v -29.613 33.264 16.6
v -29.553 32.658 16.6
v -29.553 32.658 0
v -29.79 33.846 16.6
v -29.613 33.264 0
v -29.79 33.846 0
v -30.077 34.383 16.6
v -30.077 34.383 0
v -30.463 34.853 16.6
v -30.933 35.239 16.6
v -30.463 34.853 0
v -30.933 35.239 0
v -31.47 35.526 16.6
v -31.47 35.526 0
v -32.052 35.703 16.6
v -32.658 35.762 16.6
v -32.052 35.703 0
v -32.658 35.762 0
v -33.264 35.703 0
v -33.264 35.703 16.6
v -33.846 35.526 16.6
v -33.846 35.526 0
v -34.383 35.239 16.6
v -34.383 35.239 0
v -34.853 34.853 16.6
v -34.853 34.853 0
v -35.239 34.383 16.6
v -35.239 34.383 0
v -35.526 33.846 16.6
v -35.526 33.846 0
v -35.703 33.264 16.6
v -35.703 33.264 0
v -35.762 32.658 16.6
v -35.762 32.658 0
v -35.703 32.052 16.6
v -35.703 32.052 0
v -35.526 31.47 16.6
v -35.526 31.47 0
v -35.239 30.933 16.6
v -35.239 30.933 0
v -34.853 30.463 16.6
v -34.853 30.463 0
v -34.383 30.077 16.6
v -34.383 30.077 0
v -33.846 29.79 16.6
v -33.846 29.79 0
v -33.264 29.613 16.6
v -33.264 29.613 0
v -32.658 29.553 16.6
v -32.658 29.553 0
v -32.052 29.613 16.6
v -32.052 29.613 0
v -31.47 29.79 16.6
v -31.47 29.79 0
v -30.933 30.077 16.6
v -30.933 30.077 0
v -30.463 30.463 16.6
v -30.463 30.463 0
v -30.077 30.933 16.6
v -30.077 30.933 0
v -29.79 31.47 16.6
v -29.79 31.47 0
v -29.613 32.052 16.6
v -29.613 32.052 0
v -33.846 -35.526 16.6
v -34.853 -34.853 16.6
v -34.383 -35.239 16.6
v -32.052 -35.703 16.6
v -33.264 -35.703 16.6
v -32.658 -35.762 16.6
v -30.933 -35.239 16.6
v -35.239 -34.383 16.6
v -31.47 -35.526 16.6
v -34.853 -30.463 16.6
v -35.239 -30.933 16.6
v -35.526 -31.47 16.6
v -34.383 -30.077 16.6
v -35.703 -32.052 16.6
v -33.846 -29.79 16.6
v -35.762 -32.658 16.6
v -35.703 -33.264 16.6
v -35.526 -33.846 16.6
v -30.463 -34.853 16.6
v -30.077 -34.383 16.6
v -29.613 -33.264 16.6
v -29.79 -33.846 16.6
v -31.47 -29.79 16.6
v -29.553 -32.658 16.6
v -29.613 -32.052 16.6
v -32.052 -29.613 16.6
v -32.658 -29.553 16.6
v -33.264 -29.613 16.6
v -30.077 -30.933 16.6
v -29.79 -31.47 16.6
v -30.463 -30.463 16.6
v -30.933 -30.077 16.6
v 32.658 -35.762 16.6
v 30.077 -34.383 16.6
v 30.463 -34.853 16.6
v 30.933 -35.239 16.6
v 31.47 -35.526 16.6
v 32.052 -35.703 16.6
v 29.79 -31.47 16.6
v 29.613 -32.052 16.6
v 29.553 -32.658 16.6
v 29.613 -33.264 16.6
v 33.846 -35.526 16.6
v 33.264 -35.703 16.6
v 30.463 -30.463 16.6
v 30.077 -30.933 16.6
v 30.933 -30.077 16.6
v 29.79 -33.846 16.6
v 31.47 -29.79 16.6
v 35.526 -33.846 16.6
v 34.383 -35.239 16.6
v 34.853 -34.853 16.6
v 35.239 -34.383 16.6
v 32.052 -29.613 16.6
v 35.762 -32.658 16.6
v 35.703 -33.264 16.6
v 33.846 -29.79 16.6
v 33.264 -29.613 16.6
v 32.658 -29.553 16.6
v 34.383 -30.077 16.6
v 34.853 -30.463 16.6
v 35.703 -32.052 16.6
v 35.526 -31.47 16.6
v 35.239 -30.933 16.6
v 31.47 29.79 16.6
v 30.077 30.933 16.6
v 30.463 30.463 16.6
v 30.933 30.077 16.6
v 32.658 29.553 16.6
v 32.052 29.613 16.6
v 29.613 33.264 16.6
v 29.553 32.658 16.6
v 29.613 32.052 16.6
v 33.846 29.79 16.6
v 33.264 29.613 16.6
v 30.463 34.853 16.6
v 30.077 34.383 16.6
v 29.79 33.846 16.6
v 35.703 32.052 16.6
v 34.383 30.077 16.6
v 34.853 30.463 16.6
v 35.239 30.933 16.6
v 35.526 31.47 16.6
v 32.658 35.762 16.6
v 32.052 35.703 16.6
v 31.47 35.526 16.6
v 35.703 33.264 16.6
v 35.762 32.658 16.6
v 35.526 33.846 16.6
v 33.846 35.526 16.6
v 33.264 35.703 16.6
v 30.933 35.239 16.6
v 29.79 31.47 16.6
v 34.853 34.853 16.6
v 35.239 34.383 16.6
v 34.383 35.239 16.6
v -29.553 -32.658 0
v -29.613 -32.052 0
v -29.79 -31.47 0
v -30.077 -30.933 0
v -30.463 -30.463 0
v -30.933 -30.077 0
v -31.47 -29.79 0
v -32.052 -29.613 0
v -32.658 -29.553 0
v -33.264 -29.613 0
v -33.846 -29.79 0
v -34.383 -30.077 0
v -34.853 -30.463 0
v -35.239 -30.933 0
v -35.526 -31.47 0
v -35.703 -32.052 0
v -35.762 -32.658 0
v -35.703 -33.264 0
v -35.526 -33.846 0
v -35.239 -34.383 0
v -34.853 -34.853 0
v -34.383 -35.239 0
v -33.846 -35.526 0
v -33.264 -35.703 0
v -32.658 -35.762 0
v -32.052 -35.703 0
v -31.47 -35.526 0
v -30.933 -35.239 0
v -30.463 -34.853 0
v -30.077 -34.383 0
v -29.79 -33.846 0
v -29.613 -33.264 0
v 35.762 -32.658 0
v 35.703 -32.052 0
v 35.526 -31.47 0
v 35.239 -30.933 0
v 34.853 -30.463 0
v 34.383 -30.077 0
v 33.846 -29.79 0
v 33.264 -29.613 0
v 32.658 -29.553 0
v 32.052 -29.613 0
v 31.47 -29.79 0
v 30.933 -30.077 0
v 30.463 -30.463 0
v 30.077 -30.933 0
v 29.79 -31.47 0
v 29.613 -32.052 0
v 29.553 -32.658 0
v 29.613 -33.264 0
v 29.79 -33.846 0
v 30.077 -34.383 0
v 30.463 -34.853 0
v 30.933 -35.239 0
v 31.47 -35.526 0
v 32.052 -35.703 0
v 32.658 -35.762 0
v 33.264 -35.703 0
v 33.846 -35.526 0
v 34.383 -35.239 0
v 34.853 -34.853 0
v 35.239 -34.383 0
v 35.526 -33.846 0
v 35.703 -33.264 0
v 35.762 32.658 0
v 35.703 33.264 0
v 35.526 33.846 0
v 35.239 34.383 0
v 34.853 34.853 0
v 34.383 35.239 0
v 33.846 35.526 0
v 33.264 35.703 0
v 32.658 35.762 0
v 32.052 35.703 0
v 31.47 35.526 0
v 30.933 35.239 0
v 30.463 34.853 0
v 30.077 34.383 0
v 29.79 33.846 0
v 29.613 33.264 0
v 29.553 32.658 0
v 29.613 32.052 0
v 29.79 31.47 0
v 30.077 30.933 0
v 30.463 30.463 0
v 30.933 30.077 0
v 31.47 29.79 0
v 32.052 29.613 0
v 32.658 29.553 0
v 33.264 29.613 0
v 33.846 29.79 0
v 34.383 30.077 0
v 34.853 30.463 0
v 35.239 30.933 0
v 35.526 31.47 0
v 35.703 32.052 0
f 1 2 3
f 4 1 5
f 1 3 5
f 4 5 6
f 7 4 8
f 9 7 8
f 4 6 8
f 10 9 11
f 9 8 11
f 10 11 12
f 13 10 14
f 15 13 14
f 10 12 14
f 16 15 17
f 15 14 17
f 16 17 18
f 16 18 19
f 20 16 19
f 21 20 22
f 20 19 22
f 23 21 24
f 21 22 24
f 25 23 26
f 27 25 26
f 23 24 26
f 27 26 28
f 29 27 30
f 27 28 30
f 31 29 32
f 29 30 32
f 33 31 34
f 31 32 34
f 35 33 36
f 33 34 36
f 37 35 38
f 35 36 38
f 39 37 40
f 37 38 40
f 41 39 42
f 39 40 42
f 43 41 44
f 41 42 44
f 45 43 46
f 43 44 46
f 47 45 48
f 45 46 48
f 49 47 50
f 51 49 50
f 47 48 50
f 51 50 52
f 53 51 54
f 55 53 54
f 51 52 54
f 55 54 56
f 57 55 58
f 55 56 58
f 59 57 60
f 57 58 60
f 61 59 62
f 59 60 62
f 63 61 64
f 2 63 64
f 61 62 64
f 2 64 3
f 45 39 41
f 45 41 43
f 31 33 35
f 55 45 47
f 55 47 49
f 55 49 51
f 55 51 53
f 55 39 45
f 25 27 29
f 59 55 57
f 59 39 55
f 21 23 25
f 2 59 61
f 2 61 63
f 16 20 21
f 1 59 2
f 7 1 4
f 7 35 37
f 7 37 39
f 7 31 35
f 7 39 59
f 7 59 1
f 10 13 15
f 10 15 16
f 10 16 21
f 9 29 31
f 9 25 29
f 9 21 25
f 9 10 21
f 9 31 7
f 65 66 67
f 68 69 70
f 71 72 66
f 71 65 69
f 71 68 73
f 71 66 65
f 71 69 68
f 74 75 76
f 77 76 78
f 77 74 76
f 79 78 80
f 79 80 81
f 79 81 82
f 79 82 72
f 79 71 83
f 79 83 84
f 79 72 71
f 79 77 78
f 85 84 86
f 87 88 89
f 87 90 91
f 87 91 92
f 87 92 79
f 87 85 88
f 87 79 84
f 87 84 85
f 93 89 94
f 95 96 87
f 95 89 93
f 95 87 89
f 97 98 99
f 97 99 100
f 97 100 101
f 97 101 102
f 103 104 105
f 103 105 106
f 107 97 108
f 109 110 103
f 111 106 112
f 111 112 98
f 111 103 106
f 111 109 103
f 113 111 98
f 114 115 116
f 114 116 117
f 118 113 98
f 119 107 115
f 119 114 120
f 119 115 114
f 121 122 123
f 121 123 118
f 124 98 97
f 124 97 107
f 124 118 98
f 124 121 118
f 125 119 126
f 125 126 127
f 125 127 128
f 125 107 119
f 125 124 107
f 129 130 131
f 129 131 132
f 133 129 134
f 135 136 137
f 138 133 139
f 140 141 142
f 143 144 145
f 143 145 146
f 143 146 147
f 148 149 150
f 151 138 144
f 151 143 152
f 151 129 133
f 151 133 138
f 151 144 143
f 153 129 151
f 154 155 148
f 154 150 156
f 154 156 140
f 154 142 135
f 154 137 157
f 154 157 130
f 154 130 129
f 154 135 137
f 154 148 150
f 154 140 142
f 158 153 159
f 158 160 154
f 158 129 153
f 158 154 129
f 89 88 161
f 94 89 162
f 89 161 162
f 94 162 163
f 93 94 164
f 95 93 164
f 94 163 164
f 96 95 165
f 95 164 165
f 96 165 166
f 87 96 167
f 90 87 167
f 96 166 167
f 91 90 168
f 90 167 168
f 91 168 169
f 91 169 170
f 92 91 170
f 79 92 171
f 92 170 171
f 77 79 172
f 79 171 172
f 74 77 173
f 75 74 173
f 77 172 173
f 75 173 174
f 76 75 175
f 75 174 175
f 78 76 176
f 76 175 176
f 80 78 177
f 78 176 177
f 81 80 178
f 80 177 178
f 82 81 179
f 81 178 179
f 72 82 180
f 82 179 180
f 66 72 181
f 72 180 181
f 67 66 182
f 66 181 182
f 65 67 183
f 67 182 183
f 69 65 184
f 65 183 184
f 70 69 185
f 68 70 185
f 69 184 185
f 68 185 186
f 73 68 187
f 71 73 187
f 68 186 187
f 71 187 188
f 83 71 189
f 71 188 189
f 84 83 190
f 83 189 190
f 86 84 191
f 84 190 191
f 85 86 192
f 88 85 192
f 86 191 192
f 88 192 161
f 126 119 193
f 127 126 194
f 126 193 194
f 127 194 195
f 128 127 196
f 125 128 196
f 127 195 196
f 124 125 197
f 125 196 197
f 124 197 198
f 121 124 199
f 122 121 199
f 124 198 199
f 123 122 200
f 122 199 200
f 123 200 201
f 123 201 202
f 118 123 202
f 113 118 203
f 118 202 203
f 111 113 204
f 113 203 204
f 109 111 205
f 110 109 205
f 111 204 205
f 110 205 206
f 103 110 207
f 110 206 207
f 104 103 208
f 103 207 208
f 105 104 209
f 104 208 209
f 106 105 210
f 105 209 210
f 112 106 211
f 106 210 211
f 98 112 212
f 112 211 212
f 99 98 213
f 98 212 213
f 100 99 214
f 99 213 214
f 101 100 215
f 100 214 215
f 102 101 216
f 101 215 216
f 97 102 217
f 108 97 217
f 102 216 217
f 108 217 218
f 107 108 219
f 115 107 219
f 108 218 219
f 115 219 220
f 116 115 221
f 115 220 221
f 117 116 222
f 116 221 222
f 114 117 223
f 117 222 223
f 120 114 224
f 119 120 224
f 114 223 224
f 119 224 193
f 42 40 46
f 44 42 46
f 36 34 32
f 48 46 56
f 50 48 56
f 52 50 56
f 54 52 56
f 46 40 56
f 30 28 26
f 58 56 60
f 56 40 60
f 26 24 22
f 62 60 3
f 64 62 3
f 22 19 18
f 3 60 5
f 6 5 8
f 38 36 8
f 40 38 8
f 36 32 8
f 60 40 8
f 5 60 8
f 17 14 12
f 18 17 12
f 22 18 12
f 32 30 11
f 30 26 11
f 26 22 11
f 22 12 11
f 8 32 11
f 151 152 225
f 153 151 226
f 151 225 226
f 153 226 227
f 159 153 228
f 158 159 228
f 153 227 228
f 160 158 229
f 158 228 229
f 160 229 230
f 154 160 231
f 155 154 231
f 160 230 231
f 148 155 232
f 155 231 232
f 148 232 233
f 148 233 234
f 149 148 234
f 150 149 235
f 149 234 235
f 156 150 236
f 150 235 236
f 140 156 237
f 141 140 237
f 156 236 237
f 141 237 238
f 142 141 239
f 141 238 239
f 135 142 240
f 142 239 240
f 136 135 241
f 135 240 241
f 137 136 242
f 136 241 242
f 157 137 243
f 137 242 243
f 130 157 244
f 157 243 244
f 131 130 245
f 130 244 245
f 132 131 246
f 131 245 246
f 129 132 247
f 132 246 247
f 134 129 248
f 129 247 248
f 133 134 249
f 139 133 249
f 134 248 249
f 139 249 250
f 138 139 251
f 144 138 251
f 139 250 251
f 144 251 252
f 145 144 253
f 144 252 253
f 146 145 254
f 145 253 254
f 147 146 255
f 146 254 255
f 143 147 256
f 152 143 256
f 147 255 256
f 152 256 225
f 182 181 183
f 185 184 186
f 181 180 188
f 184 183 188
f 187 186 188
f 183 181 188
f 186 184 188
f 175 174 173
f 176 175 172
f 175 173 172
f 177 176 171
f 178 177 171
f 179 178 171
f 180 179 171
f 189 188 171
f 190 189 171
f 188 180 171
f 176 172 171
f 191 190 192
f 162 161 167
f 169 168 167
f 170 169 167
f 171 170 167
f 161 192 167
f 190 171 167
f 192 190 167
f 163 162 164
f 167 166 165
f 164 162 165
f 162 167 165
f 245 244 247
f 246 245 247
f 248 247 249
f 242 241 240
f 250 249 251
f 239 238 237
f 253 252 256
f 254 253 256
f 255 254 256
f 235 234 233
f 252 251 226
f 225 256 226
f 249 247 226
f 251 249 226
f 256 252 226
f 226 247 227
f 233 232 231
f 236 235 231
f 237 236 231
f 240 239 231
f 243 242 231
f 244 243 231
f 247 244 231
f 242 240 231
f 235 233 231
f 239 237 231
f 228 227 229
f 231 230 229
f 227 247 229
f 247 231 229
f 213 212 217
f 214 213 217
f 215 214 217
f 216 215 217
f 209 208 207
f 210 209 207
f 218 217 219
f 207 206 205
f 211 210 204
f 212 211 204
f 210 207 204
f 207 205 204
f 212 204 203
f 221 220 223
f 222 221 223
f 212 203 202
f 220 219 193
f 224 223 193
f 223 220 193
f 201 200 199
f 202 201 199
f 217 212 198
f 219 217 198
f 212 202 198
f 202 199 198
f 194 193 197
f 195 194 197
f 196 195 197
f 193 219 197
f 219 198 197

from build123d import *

# Parameters (mm, degrees)
SKETCH1_R             = 3.104394748
BOSS_EXTRUDE1_DEPTH   = 16.6
BOSS_EXTRUDE1_2_DEPTH = 16.6
BOSS_EXTRUDE1_3_DEPTH = 16.6
BOSS_EXTRUDE1_4_DEPTH = 16.6


with BuildPart() as part:
    # Sketch1 → Boss-Extrude1 (new body)
    with BuildSketch(Plane.XY):
        with Locations((32.657870065, -32.657870065)):
            Circle(SKETCH1_R)
    extrude(amount=BOSS_EXTRUDE1_DEPTH)


with BuildPart() as body_2:
    # Sketch1 → Boss-Extrude1 2 (new body)
    with BuildSketch(Plane.XY):
        with Locations((-32.657870065, 32.657870065)):
            Circle(SKETCH1_R)
    extrude(amount=BOSS_EXTRUDE1_2_DEPTH)


with BuildPart() as body_3:
    # Sketch1 → Boss-Extrude1 3 (new body)
    with BuildSketch(Plane.XY):
        with Locations((-32.657870065, -32.657870065)):
            Circle(SKETCH1_R)
    extrude(amount=BOSS_EXTRUDE1_3_DEPTH)


with BuildPart() as body_4:
    # Sketch1 → Boss-Extrude1 4 (new body)
    with BuildSketch(Plane.XY):
        with Locations((32.657870065, 32.657870065)):
            Circle(SKETCH1_R)
    extrude(amount=BOSS_EXTRUDE1_4_DEPTH)


solid = Compound([part.part, body_2.part, body_3.part, body_4.part])
